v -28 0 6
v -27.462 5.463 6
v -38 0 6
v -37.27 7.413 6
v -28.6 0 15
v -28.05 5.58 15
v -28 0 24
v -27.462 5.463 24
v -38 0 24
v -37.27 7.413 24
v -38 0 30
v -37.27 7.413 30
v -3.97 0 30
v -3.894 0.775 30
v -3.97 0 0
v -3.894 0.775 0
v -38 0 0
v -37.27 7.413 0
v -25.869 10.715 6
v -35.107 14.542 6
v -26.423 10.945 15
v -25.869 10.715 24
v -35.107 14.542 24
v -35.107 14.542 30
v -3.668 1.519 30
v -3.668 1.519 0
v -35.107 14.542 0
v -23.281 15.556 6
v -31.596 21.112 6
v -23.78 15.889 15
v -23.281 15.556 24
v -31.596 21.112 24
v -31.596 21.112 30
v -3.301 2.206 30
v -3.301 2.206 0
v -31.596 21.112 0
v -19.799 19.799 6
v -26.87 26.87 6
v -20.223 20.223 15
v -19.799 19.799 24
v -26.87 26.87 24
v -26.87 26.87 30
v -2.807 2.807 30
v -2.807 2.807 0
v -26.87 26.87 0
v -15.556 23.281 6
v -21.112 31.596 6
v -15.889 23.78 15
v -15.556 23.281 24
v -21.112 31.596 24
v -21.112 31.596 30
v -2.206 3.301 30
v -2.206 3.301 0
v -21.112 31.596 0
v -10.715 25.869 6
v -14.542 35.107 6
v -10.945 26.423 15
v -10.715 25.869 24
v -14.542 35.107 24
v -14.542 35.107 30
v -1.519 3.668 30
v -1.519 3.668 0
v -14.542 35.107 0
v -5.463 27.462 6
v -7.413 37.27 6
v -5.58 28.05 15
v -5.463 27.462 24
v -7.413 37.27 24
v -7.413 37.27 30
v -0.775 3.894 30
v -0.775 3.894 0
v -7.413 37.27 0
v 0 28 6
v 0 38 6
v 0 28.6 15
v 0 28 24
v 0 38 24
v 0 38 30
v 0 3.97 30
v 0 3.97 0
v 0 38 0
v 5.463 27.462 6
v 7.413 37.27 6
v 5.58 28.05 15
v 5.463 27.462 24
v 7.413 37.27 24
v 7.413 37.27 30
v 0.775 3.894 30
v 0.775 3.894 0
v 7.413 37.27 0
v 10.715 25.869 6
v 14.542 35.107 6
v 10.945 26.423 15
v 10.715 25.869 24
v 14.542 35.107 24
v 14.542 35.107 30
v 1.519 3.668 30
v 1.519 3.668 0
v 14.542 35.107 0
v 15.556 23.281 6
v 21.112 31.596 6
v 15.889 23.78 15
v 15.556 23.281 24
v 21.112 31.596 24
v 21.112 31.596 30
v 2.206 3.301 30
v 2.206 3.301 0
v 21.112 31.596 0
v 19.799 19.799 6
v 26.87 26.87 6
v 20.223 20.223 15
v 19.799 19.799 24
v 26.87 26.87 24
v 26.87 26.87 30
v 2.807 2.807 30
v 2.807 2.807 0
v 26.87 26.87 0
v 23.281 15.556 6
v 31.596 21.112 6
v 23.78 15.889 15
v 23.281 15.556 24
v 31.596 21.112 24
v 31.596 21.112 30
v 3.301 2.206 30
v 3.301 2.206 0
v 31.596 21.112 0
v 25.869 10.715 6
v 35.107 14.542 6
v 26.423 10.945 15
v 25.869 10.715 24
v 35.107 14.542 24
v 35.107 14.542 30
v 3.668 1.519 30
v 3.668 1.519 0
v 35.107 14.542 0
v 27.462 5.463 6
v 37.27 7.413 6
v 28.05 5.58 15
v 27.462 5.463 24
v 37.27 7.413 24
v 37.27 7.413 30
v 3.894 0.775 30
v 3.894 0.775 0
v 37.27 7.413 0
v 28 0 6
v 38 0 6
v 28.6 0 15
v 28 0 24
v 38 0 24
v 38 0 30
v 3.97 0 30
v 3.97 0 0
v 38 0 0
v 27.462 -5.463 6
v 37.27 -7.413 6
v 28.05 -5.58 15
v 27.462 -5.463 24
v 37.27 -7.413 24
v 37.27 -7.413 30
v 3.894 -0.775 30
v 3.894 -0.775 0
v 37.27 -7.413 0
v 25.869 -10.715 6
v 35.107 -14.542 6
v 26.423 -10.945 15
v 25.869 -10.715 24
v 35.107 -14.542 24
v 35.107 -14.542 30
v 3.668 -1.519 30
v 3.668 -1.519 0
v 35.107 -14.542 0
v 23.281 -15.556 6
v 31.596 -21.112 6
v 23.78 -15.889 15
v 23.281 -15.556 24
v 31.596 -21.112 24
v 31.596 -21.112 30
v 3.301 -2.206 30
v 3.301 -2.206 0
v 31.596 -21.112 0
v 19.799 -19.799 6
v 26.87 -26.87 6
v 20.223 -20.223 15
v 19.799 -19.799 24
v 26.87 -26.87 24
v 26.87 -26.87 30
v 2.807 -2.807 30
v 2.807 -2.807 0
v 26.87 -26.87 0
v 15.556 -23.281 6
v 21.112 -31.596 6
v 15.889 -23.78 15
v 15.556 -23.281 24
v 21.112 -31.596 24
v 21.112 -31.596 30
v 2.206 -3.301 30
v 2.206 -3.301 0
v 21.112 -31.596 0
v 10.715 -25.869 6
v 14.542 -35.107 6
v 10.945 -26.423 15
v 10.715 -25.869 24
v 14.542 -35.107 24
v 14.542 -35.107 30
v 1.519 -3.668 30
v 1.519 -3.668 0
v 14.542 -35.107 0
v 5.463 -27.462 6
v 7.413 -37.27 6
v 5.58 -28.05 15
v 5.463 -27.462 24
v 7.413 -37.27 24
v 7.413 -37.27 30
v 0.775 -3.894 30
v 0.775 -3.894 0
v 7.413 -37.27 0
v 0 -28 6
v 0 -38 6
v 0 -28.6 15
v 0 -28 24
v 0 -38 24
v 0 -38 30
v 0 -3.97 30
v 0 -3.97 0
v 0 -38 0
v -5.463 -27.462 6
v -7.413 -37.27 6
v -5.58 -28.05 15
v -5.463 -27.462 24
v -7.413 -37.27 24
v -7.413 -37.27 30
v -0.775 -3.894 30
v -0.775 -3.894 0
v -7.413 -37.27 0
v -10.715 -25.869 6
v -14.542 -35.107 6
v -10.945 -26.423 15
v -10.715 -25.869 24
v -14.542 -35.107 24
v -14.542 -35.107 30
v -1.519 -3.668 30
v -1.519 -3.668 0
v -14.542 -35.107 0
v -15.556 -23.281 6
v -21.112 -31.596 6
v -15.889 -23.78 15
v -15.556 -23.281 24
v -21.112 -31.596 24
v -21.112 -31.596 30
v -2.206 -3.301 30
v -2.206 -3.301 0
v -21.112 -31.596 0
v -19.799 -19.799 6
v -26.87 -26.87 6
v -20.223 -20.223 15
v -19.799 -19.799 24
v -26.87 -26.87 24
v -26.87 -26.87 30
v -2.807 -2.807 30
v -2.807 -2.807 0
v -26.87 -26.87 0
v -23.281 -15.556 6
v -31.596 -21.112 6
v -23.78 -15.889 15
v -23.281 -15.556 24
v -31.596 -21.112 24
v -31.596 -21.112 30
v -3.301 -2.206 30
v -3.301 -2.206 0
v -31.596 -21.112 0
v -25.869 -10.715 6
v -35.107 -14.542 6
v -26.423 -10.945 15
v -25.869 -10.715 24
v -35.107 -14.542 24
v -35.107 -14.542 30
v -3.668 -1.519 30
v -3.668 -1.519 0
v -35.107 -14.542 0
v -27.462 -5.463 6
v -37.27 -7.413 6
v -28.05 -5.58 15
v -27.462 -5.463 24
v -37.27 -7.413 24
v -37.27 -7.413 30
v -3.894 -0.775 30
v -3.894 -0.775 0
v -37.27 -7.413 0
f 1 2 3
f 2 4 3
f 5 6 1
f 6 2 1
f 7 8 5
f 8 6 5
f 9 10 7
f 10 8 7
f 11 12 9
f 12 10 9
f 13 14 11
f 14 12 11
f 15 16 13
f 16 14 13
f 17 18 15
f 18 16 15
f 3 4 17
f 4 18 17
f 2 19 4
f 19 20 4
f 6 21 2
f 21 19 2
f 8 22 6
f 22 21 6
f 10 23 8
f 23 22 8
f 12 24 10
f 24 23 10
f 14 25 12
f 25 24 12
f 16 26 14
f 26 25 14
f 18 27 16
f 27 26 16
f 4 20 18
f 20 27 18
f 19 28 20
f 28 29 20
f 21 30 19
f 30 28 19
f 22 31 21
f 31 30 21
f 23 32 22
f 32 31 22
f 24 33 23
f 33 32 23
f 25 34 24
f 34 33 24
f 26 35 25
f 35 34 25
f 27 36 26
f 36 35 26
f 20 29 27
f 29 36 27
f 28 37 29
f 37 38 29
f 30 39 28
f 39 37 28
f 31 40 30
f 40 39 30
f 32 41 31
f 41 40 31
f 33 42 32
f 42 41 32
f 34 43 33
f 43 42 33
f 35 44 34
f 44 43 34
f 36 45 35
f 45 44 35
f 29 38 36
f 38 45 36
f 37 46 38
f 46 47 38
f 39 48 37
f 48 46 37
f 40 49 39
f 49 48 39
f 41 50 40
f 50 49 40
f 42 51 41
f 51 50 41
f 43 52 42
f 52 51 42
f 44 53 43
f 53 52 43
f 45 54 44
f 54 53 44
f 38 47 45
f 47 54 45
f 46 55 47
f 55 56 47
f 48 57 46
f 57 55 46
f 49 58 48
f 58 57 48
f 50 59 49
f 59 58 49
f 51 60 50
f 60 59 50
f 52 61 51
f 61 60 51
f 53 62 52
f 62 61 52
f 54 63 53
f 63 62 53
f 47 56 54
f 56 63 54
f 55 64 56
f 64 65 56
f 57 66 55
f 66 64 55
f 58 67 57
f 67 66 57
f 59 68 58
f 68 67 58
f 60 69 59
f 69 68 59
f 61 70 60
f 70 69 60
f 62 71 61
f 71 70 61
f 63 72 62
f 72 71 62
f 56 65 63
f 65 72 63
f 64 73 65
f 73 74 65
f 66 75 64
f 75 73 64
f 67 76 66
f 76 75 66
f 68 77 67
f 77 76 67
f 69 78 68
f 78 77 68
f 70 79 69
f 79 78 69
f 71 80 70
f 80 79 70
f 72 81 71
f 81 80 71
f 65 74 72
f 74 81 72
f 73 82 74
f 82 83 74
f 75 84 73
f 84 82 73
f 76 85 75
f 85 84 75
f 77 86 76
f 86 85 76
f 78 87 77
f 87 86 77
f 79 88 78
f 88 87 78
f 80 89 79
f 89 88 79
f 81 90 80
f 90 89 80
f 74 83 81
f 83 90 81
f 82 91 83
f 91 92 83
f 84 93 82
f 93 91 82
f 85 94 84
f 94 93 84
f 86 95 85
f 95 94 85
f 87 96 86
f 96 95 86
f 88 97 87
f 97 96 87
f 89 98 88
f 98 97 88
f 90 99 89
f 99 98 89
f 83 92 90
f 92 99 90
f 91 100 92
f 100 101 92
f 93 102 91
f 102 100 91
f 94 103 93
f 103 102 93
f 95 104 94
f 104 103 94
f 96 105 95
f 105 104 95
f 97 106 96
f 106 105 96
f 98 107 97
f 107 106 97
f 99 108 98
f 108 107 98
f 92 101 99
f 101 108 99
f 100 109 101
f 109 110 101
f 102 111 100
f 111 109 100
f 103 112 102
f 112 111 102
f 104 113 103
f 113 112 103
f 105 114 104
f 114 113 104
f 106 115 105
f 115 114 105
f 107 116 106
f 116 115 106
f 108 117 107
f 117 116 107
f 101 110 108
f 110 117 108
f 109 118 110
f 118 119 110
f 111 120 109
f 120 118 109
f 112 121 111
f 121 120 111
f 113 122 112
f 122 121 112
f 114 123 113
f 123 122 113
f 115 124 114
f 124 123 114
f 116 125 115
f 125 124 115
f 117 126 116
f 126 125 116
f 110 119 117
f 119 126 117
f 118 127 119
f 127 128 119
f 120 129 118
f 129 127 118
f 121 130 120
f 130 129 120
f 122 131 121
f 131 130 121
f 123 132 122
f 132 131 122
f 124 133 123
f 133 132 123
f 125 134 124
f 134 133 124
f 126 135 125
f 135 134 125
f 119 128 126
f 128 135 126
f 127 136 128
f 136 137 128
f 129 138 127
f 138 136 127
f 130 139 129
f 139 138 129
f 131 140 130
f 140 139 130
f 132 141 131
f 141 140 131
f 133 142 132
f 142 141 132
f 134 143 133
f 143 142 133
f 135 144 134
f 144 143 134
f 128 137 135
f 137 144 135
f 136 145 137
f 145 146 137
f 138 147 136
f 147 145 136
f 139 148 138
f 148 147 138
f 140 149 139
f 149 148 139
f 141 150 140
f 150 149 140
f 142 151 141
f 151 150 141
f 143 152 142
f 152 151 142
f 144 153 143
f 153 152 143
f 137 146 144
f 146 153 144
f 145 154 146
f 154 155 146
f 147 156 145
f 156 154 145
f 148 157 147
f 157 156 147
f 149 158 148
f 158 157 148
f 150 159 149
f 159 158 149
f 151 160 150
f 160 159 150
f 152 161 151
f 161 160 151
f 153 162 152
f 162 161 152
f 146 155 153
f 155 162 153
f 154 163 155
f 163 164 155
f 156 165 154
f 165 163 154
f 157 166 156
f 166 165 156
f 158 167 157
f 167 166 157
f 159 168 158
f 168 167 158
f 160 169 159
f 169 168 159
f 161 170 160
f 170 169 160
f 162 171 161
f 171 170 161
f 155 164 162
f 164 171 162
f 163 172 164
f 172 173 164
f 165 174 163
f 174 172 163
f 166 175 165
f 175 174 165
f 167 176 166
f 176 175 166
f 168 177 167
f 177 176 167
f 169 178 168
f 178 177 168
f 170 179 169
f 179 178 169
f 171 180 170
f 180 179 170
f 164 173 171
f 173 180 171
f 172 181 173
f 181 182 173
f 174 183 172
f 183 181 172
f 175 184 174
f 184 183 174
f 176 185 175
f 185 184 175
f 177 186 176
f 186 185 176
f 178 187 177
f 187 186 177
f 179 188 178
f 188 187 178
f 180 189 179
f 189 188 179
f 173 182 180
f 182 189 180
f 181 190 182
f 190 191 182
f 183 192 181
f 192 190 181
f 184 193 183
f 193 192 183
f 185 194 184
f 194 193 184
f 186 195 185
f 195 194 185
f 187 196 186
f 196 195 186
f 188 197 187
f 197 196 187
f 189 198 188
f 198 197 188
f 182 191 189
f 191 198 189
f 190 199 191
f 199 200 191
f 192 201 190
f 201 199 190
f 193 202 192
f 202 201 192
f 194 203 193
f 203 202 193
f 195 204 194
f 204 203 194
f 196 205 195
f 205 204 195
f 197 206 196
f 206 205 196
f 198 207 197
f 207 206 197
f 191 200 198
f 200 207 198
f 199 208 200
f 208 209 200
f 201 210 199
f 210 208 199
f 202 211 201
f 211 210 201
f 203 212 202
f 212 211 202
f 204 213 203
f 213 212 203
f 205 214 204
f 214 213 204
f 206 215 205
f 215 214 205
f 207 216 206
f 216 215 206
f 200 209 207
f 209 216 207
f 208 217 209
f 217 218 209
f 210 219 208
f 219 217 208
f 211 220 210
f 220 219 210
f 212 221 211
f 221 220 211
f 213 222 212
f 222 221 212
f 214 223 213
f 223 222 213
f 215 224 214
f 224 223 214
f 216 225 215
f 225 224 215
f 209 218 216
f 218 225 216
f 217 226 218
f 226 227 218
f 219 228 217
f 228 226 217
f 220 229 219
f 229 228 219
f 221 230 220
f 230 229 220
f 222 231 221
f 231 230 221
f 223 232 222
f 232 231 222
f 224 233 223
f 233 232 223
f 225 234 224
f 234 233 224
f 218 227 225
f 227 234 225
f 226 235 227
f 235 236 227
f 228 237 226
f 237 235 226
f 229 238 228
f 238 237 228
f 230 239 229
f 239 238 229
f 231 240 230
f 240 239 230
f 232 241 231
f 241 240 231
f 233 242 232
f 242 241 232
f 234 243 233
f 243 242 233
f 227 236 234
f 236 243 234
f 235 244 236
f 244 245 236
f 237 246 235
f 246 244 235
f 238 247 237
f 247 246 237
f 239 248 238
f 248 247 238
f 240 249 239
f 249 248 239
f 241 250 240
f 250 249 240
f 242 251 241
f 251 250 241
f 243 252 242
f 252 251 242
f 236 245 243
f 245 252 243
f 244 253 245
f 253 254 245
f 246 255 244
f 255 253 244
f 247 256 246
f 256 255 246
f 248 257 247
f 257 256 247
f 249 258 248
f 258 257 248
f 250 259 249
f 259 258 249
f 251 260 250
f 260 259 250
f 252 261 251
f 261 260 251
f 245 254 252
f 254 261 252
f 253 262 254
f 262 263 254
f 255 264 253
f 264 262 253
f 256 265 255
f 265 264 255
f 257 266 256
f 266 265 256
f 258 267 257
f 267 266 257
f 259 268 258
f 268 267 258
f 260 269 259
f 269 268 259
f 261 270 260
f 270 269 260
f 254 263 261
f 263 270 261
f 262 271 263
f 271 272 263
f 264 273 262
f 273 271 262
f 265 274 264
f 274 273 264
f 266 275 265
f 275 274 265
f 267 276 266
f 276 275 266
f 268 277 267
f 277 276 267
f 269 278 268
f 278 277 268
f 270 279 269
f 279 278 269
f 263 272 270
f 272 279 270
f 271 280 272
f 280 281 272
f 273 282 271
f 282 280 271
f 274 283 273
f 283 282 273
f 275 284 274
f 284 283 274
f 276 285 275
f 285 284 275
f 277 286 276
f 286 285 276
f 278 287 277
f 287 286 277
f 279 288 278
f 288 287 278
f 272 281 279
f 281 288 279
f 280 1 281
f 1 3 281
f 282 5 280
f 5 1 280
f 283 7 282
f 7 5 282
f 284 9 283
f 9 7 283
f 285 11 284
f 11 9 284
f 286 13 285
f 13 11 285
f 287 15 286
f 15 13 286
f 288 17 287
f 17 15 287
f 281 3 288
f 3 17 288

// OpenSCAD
$fn = 32;

// ----------------------------------------------------------------------
// Belt roller: 56 mm barrel, 30 mm wide, bore 7.94 mm
// ----------------------------------------------------------------------

// --- parameters (mm) ---
bore_d = 7.94;            // bore
barrel_d = 56;            // barrel diameter
roller_w = 30;            // roller width
flange_d = 76;            // flange diameter
flange_t = 6;             // flange thickness
hub_d = 31.94;            // hub diameter

roller_profile = [[3.97, 0], [38, 0], [38, 6], [28, 6], [28.6, 15], [28, 24], [38, 24], [38, 30], [3.97, 30]];

/* the profile stays clear of the axis, so the bore comes out of the revolve */
rotate_extrude() polygon(roller_profile);
